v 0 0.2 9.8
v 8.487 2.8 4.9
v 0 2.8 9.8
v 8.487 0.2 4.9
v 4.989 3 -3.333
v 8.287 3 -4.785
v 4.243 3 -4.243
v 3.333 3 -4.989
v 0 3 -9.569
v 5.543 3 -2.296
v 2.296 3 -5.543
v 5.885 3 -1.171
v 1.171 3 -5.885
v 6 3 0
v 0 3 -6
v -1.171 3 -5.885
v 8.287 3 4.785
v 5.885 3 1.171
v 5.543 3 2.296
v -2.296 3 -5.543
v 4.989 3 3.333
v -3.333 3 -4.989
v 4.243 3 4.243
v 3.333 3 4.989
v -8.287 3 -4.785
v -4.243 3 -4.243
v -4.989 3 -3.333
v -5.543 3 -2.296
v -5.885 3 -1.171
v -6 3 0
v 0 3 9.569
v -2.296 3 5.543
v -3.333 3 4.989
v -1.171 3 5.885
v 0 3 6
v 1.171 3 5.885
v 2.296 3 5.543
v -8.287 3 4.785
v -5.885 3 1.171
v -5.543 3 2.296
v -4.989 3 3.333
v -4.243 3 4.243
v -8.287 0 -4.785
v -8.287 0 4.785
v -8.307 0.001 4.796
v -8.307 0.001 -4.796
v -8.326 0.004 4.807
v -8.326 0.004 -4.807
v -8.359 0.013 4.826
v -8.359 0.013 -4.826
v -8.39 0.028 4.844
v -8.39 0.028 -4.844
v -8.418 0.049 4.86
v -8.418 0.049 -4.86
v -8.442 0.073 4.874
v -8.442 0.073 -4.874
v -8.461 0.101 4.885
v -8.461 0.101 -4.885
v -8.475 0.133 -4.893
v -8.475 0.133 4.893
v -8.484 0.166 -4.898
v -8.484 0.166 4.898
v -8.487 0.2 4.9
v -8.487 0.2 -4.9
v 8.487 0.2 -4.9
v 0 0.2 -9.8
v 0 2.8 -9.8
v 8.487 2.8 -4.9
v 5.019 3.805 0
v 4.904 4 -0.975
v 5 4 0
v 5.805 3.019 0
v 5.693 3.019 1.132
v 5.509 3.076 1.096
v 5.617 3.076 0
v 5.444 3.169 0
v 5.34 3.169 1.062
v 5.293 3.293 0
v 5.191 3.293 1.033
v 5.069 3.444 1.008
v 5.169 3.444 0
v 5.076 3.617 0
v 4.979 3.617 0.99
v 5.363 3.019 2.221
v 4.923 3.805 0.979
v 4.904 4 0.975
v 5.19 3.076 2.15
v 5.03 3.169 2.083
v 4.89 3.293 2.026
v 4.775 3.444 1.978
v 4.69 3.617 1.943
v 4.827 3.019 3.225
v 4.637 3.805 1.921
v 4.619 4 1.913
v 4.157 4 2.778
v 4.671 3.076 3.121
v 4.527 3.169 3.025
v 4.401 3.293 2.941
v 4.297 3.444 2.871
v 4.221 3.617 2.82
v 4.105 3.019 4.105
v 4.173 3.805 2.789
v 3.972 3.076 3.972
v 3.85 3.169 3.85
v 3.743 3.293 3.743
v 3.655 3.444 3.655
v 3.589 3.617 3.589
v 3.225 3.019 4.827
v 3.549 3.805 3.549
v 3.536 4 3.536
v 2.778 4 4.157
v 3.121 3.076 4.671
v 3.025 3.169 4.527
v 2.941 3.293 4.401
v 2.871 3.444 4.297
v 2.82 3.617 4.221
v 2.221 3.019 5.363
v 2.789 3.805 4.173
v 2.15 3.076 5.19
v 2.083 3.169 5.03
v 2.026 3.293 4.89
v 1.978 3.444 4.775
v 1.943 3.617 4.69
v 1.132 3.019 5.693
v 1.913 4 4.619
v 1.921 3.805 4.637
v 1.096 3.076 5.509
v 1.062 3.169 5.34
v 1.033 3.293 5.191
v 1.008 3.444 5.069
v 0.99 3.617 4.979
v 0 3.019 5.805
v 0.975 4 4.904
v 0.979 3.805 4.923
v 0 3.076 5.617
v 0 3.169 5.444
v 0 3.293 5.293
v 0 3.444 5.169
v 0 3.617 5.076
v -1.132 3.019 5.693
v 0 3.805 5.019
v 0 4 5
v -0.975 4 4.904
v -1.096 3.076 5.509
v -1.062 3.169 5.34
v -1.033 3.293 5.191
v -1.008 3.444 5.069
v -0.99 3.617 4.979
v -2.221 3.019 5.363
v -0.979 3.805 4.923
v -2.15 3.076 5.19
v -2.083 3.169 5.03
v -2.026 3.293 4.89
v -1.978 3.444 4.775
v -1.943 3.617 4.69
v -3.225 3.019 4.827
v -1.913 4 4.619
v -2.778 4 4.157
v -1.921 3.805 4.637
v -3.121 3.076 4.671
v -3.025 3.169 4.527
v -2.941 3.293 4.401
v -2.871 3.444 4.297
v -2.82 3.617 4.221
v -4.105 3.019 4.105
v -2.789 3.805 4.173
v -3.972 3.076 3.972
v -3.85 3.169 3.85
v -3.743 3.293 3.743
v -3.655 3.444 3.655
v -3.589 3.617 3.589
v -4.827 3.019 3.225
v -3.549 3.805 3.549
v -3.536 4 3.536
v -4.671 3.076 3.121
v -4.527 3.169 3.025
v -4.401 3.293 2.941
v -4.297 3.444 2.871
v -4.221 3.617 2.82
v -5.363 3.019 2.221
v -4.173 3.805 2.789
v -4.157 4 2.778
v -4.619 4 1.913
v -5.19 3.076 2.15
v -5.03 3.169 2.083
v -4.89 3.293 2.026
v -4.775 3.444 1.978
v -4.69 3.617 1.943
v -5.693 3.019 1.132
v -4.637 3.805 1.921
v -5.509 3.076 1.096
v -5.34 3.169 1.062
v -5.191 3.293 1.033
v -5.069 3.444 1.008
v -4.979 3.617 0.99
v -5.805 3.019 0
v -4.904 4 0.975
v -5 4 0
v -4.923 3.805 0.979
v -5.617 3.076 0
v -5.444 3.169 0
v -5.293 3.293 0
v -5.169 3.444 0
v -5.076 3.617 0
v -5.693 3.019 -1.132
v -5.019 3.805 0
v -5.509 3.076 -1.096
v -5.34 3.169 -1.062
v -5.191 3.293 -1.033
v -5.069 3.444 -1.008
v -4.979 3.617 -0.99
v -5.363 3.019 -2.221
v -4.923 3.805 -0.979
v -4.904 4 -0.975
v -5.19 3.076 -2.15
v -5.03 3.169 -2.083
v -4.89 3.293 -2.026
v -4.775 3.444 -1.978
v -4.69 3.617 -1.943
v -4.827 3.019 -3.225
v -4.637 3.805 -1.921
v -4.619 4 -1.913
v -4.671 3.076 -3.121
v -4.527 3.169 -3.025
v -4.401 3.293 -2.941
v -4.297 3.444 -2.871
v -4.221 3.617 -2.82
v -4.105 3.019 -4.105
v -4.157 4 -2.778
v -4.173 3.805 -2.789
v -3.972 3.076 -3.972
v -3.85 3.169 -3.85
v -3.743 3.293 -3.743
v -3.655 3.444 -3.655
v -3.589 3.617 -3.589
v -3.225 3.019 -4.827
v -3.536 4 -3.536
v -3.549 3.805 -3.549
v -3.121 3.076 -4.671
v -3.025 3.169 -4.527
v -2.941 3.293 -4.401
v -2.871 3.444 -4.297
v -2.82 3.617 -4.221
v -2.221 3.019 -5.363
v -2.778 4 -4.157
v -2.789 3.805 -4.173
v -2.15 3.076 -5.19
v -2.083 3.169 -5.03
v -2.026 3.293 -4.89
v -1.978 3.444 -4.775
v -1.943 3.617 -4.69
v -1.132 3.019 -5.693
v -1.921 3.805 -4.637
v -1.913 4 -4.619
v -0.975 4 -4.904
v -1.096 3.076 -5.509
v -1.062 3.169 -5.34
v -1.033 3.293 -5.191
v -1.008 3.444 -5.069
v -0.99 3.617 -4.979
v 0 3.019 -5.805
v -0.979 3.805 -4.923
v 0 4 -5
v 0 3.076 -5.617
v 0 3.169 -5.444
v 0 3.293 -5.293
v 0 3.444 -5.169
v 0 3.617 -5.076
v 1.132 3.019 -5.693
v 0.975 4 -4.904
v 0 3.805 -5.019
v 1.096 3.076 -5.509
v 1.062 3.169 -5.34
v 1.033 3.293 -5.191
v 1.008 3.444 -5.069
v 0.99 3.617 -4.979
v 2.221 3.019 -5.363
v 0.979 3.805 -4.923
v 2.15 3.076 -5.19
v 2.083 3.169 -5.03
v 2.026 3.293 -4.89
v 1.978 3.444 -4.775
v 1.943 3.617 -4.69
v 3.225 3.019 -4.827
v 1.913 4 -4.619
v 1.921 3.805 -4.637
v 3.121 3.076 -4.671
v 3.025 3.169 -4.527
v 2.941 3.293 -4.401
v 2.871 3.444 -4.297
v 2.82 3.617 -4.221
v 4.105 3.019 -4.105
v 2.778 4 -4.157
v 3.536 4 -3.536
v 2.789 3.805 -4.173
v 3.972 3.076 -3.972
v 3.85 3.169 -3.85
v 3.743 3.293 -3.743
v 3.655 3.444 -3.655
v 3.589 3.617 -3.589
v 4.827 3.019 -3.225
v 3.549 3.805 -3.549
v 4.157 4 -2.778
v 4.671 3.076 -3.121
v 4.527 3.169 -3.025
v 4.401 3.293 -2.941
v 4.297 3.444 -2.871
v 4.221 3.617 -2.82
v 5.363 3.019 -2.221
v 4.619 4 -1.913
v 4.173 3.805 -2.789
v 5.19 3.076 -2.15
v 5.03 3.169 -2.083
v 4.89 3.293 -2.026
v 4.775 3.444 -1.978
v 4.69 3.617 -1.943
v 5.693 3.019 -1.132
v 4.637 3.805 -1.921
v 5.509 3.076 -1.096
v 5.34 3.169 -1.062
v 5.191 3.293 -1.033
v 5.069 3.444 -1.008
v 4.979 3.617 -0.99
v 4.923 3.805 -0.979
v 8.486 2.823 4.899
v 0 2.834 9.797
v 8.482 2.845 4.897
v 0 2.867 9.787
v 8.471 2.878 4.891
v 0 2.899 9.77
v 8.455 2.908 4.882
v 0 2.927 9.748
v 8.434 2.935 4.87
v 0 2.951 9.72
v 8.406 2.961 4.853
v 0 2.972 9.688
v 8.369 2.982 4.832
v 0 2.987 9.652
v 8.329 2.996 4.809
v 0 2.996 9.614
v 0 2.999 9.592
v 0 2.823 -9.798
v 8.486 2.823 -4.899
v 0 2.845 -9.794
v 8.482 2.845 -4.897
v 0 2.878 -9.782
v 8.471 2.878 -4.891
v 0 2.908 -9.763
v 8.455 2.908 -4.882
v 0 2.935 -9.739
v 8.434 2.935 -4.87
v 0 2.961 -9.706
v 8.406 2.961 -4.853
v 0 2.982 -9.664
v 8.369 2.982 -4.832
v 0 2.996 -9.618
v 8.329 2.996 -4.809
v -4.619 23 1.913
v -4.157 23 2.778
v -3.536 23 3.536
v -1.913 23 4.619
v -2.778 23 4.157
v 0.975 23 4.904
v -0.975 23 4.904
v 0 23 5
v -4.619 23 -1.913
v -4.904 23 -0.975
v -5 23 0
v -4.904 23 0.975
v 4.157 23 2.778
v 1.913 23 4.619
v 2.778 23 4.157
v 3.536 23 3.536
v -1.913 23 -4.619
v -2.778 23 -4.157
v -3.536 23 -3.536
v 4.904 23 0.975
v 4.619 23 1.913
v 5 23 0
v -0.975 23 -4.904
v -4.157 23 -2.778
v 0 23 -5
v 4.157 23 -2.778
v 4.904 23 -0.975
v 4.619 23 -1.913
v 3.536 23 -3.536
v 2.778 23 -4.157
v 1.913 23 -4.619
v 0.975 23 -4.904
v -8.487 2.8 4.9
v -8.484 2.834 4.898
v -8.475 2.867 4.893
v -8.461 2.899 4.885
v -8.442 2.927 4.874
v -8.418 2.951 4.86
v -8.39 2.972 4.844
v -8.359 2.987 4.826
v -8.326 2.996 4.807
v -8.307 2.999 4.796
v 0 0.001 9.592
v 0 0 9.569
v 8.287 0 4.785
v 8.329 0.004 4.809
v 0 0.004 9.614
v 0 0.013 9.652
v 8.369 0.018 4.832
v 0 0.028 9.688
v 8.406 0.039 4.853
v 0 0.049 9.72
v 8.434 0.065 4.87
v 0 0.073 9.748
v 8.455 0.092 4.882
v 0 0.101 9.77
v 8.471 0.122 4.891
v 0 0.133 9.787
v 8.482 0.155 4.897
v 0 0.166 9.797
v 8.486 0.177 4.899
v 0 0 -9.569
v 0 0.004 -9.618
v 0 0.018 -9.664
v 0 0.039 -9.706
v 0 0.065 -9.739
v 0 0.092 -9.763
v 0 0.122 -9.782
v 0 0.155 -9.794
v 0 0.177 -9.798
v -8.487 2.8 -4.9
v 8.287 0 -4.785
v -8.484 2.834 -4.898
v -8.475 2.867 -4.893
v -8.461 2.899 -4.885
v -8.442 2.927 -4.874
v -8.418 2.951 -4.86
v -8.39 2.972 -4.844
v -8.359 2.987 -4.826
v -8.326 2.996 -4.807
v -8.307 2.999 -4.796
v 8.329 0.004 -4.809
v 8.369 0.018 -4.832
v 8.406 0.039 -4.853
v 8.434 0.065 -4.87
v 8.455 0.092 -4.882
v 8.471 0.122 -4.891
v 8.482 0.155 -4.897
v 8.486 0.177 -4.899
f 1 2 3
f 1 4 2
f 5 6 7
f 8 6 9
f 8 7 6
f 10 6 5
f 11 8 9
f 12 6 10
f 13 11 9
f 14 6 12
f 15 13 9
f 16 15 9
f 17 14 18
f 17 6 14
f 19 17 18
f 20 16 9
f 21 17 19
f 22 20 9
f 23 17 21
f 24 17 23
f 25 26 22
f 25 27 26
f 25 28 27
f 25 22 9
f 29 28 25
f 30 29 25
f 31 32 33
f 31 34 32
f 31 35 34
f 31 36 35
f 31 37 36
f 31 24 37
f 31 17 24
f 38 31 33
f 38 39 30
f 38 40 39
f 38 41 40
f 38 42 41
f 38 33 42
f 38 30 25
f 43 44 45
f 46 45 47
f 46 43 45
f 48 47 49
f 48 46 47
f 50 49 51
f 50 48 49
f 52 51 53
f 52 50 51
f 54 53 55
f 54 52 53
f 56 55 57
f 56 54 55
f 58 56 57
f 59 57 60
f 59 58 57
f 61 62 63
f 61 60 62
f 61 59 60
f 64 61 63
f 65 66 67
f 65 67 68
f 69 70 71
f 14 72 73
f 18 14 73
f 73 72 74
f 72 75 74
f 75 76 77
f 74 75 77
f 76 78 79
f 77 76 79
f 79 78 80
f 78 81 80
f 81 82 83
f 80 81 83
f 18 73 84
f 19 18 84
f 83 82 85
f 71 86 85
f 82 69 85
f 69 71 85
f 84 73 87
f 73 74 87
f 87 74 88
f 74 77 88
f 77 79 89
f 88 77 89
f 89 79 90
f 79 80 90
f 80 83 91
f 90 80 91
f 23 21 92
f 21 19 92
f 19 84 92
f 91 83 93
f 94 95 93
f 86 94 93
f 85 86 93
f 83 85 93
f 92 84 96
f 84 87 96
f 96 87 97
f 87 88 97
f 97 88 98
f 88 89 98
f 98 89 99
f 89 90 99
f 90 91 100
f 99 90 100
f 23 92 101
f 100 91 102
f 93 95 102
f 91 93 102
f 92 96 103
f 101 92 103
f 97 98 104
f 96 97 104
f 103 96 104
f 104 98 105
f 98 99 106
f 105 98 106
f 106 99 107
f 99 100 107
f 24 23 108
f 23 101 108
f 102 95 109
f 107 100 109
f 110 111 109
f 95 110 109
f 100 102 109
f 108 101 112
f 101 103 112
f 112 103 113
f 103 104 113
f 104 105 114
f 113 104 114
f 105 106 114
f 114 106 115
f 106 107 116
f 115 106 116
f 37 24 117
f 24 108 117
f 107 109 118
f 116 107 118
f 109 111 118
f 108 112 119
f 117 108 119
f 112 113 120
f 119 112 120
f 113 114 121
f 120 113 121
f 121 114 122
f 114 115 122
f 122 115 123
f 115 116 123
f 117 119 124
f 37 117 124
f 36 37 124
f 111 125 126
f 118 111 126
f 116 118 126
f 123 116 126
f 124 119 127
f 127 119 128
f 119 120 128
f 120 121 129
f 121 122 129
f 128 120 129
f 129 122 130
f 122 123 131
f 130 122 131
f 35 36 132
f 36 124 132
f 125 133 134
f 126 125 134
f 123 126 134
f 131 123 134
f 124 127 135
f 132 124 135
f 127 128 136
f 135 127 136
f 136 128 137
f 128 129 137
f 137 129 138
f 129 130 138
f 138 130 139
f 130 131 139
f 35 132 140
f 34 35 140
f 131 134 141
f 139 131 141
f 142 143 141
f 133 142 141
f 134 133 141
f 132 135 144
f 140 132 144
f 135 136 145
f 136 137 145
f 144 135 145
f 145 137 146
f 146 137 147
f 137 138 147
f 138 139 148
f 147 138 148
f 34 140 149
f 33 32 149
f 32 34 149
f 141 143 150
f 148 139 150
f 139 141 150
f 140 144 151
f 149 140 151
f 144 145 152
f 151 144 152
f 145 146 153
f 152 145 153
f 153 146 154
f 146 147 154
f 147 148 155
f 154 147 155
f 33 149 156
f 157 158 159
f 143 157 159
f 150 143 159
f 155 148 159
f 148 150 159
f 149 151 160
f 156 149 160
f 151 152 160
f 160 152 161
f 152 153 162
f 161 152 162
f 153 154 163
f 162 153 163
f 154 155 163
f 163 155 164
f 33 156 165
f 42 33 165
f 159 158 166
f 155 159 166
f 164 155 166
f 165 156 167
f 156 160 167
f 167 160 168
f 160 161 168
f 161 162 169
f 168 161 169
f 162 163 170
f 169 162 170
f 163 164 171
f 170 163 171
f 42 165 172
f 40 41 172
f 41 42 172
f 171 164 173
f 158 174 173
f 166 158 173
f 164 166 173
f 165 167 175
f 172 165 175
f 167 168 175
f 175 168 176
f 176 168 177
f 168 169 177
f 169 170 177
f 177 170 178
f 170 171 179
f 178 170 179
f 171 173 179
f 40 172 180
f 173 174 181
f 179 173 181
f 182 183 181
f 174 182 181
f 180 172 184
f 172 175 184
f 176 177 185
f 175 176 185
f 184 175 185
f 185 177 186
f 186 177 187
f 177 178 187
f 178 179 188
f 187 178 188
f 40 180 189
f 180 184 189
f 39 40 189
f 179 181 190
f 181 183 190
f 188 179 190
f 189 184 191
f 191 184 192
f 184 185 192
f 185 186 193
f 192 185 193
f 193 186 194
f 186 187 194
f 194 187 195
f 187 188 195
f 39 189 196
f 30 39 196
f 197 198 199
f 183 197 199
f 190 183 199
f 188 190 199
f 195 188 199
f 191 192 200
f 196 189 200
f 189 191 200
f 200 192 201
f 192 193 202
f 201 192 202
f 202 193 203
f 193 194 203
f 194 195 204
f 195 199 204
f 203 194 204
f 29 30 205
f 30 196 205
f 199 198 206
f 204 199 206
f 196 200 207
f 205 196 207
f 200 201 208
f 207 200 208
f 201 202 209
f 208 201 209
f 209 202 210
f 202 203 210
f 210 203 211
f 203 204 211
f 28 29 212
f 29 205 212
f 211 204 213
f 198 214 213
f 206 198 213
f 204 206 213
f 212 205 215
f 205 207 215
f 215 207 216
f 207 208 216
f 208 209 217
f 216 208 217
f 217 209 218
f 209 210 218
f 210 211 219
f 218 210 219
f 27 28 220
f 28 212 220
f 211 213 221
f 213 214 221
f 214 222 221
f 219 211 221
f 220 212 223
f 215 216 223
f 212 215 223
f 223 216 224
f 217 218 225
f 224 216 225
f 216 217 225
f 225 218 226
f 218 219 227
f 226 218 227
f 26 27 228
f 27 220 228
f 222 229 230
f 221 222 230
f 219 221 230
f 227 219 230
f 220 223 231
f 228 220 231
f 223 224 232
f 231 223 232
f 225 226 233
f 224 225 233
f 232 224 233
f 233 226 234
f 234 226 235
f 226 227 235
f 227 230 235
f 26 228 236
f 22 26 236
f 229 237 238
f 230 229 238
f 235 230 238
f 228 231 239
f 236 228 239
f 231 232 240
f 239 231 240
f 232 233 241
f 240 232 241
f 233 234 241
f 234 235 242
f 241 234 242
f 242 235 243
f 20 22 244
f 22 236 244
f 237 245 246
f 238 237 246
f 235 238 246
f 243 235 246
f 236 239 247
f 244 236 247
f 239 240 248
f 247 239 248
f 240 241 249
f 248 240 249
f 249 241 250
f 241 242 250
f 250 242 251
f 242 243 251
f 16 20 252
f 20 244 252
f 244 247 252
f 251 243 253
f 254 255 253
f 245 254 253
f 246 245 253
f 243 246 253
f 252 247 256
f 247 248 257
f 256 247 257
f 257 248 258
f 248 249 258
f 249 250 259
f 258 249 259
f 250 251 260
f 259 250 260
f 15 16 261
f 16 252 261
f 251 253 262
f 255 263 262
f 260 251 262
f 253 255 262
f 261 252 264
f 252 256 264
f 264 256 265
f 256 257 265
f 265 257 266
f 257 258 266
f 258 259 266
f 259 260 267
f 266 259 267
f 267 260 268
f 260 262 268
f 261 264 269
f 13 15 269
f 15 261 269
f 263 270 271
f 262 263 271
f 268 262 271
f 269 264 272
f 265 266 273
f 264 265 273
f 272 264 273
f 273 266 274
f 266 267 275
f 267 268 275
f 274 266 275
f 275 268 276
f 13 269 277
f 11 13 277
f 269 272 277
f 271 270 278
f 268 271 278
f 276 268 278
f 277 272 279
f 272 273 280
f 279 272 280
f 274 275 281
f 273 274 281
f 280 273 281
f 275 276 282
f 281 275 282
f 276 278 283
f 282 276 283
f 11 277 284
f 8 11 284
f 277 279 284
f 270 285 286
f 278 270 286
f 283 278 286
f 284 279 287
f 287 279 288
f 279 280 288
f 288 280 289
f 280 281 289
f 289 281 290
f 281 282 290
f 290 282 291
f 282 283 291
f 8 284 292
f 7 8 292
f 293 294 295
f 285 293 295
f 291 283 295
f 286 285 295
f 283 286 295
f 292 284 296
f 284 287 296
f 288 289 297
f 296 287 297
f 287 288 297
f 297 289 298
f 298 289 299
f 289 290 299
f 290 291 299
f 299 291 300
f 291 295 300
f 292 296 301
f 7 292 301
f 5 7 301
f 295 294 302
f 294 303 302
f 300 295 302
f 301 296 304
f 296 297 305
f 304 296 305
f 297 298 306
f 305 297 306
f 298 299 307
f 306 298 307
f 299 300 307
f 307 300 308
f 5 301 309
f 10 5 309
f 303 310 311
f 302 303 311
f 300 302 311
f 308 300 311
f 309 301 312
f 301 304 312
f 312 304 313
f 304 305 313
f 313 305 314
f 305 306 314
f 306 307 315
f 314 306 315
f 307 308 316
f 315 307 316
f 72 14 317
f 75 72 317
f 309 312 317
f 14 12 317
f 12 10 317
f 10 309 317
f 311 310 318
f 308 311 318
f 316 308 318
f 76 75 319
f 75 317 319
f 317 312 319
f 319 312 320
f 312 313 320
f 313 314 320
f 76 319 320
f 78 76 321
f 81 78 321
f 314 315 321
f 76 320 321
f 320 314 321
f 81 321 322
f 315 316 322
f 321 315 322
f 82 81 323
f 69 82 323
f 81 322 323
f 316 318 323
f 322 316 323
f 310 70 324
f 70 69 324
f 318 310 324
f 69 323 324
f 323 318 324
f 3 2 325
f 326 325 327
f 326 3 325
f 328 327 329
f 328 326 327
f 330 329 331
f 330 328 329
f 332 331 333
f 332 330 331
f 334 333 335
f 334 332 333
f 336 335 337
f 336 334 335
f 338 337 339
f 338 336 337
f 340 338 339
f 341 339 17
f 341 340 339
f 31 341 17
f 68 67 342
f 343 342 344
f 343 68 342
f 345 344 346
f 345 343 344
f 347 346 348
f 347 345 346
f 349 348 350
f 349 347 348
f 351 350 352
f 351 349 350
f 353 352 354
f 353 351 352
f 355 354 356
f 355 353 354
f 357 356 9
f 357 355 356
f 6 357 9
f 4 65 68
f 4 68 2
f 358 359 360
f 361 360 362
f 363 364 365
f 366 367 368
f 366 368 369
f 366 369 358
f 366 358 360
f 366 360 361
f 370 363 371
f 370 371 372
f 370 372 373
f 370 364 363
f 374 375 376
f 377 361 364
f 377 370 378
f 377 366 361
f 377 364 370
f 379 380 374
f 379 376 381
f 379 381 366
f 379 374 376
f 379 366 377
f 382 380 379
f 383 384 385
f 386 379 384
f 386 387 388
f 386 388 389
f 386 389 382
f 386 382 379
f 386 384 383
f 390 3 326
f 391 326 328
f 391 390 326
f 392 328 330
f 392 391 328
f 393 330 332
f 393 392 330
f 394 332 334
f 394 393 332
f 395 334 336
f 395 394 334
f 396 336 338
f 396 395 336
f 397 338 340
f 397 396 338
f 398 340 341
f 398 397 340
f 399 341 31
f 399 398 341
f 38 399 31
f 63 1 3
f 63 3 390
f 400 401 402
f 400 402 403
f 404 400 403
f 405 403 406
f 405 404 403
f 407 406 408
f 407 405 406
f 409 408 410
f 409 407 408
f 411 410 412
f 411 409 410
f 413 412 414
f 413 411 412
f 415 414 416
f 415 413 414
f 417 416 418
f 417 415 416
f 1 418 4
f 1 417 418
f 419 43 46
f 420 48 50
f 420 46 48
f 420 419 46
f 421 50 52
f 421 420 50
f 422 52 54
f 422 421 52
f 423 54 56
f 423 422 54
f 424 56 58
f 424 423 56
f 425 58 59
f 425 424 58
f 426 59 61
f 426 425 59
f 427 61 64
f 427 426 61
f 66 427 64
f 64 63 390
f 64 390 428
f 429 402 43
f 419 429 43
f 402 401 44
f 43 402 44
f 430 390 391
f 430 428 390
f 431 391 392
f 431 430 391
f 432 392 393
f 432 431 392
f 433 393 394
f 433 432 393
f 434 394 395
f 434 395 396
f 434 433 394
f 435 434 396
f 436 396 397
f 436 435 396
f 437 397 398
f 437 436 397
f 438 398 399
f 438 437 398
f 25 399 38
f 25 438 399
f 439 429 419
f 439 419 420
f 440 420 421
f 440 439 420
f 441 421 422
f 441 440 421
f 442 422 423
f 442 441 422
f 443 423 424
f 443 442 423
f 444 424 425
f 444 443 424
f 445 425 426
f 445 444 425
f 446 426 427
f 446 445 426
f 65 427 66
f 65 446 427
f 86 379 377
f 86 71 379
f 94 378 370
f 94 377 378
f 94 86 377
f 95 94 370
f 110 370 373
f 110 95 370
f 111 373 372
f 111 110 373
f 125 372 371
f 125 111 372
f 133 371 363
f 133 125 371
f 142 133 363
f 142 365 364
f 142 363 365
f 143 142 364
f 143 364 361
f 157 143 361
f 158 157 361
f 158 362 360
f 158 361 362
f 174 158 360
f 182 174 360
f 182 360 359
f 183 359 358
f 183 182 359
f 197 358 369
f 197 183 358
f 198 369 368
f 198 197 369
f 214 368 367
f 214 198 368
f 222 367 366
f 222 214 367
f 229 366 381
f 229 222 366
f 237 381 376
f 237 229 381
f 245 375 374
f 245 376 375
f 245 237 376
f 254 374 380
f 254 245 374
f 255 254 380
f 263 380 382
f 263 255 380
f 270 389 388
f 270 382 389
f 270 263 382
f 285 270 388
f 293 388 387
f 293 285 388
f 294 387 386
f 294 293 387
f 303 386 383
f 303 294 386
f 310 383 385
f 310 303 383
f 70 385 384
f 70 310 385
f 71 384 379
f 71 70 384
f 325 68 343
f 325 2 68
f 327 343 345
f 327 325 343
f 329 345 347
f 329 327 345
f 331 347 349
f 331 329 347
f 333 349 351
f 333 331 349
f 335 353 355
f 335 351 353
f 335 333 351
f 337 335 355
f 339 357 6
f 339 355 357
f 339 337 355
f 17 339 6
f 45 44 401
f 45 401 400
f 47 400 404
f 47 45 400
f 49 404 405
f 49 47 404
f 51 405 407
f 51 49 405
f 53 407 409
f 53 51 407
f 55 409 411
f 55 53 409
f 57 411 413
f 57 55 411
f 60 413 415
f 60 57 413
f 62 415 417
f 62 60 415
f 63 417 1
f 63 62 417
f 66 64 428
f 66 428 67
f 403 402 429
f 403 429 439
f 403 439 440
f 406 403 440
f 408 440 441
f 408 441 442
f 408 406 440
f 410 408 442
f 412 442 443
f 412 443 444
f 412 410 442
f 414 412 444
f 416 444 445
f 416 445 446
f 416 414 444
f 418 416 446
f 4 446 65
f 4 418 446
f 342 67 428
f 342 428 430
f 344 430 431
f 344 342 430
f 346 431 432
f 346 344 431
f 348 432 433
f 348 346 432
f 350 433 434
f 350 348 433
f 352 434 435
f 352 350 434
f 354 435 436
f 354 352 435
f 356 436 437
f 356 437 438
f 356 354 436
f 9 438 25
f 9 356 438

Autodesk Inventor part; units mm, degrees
ref_plane "YZ Plane" through (0, 0, 0) normal (1, 0, 0) x (0, 1, 0)
ref_plane "XZ Plane" through (0, 0, 0) normal (0, 1, 0) x (-1, 0, 0)
ref_plane "XY Plane" through (0, 0, 0) normal (0, 0, 1) x (1, 0, 0)
sketch "Sketch1" plane through (0, 0, 0) normal (0, 1, 0) x (-1, 0, 0)
  line L0 (0, 9.8) -> (8.487, 4.9)
  line L1 (8.487, 4.9) -> (8.487, -4.9)
  line L2 (8.487, -4.9) -> (0, -9.8)
  line L3 (0, -9.8) -> (-8.487, -4.9)
  line L4 (-8.487, -4.9) -> (-8.487, 4.9)
  line L5 (-8.487, 4.9) -> (0, 9.8)
  point P0 (0, 0)
  point P1 (0, 0)
  dimension "d3" = 19.6
extrude "Extrusion1" add sketch "Sketch1" along normal blind 3
sketch "Sketch2" plane through (0, 3, 0) normal (0, 1, 0) x (1, 0, 0)
  circle A0 centre (0, 0) radius 5
  dimension "d4" = 10
extrude "Extrusion2" add sketch "Sketch2" along normal blind 20
fillet "Fillet1" radius 0.2 12 edges at (-4.2435, 3, 7.35) (-8.487, 3, 0) (-8.487, 0, 0) (-4.2435, 3, -7.35) (-4.2435, 0, -7.35) (4.2435, 3, -7.35) (4.2435, 0, -7.35) (8.487, 3, 0) (8.487, 0, 0) (4.2435, 3, 7.35) (4.2435, 0, 7.35) (-4.2435, 0, 7.35)
fillet "Fillet2" radius 1 1 edges at (-5, 3, 0)
properties part number "M10bolt"
